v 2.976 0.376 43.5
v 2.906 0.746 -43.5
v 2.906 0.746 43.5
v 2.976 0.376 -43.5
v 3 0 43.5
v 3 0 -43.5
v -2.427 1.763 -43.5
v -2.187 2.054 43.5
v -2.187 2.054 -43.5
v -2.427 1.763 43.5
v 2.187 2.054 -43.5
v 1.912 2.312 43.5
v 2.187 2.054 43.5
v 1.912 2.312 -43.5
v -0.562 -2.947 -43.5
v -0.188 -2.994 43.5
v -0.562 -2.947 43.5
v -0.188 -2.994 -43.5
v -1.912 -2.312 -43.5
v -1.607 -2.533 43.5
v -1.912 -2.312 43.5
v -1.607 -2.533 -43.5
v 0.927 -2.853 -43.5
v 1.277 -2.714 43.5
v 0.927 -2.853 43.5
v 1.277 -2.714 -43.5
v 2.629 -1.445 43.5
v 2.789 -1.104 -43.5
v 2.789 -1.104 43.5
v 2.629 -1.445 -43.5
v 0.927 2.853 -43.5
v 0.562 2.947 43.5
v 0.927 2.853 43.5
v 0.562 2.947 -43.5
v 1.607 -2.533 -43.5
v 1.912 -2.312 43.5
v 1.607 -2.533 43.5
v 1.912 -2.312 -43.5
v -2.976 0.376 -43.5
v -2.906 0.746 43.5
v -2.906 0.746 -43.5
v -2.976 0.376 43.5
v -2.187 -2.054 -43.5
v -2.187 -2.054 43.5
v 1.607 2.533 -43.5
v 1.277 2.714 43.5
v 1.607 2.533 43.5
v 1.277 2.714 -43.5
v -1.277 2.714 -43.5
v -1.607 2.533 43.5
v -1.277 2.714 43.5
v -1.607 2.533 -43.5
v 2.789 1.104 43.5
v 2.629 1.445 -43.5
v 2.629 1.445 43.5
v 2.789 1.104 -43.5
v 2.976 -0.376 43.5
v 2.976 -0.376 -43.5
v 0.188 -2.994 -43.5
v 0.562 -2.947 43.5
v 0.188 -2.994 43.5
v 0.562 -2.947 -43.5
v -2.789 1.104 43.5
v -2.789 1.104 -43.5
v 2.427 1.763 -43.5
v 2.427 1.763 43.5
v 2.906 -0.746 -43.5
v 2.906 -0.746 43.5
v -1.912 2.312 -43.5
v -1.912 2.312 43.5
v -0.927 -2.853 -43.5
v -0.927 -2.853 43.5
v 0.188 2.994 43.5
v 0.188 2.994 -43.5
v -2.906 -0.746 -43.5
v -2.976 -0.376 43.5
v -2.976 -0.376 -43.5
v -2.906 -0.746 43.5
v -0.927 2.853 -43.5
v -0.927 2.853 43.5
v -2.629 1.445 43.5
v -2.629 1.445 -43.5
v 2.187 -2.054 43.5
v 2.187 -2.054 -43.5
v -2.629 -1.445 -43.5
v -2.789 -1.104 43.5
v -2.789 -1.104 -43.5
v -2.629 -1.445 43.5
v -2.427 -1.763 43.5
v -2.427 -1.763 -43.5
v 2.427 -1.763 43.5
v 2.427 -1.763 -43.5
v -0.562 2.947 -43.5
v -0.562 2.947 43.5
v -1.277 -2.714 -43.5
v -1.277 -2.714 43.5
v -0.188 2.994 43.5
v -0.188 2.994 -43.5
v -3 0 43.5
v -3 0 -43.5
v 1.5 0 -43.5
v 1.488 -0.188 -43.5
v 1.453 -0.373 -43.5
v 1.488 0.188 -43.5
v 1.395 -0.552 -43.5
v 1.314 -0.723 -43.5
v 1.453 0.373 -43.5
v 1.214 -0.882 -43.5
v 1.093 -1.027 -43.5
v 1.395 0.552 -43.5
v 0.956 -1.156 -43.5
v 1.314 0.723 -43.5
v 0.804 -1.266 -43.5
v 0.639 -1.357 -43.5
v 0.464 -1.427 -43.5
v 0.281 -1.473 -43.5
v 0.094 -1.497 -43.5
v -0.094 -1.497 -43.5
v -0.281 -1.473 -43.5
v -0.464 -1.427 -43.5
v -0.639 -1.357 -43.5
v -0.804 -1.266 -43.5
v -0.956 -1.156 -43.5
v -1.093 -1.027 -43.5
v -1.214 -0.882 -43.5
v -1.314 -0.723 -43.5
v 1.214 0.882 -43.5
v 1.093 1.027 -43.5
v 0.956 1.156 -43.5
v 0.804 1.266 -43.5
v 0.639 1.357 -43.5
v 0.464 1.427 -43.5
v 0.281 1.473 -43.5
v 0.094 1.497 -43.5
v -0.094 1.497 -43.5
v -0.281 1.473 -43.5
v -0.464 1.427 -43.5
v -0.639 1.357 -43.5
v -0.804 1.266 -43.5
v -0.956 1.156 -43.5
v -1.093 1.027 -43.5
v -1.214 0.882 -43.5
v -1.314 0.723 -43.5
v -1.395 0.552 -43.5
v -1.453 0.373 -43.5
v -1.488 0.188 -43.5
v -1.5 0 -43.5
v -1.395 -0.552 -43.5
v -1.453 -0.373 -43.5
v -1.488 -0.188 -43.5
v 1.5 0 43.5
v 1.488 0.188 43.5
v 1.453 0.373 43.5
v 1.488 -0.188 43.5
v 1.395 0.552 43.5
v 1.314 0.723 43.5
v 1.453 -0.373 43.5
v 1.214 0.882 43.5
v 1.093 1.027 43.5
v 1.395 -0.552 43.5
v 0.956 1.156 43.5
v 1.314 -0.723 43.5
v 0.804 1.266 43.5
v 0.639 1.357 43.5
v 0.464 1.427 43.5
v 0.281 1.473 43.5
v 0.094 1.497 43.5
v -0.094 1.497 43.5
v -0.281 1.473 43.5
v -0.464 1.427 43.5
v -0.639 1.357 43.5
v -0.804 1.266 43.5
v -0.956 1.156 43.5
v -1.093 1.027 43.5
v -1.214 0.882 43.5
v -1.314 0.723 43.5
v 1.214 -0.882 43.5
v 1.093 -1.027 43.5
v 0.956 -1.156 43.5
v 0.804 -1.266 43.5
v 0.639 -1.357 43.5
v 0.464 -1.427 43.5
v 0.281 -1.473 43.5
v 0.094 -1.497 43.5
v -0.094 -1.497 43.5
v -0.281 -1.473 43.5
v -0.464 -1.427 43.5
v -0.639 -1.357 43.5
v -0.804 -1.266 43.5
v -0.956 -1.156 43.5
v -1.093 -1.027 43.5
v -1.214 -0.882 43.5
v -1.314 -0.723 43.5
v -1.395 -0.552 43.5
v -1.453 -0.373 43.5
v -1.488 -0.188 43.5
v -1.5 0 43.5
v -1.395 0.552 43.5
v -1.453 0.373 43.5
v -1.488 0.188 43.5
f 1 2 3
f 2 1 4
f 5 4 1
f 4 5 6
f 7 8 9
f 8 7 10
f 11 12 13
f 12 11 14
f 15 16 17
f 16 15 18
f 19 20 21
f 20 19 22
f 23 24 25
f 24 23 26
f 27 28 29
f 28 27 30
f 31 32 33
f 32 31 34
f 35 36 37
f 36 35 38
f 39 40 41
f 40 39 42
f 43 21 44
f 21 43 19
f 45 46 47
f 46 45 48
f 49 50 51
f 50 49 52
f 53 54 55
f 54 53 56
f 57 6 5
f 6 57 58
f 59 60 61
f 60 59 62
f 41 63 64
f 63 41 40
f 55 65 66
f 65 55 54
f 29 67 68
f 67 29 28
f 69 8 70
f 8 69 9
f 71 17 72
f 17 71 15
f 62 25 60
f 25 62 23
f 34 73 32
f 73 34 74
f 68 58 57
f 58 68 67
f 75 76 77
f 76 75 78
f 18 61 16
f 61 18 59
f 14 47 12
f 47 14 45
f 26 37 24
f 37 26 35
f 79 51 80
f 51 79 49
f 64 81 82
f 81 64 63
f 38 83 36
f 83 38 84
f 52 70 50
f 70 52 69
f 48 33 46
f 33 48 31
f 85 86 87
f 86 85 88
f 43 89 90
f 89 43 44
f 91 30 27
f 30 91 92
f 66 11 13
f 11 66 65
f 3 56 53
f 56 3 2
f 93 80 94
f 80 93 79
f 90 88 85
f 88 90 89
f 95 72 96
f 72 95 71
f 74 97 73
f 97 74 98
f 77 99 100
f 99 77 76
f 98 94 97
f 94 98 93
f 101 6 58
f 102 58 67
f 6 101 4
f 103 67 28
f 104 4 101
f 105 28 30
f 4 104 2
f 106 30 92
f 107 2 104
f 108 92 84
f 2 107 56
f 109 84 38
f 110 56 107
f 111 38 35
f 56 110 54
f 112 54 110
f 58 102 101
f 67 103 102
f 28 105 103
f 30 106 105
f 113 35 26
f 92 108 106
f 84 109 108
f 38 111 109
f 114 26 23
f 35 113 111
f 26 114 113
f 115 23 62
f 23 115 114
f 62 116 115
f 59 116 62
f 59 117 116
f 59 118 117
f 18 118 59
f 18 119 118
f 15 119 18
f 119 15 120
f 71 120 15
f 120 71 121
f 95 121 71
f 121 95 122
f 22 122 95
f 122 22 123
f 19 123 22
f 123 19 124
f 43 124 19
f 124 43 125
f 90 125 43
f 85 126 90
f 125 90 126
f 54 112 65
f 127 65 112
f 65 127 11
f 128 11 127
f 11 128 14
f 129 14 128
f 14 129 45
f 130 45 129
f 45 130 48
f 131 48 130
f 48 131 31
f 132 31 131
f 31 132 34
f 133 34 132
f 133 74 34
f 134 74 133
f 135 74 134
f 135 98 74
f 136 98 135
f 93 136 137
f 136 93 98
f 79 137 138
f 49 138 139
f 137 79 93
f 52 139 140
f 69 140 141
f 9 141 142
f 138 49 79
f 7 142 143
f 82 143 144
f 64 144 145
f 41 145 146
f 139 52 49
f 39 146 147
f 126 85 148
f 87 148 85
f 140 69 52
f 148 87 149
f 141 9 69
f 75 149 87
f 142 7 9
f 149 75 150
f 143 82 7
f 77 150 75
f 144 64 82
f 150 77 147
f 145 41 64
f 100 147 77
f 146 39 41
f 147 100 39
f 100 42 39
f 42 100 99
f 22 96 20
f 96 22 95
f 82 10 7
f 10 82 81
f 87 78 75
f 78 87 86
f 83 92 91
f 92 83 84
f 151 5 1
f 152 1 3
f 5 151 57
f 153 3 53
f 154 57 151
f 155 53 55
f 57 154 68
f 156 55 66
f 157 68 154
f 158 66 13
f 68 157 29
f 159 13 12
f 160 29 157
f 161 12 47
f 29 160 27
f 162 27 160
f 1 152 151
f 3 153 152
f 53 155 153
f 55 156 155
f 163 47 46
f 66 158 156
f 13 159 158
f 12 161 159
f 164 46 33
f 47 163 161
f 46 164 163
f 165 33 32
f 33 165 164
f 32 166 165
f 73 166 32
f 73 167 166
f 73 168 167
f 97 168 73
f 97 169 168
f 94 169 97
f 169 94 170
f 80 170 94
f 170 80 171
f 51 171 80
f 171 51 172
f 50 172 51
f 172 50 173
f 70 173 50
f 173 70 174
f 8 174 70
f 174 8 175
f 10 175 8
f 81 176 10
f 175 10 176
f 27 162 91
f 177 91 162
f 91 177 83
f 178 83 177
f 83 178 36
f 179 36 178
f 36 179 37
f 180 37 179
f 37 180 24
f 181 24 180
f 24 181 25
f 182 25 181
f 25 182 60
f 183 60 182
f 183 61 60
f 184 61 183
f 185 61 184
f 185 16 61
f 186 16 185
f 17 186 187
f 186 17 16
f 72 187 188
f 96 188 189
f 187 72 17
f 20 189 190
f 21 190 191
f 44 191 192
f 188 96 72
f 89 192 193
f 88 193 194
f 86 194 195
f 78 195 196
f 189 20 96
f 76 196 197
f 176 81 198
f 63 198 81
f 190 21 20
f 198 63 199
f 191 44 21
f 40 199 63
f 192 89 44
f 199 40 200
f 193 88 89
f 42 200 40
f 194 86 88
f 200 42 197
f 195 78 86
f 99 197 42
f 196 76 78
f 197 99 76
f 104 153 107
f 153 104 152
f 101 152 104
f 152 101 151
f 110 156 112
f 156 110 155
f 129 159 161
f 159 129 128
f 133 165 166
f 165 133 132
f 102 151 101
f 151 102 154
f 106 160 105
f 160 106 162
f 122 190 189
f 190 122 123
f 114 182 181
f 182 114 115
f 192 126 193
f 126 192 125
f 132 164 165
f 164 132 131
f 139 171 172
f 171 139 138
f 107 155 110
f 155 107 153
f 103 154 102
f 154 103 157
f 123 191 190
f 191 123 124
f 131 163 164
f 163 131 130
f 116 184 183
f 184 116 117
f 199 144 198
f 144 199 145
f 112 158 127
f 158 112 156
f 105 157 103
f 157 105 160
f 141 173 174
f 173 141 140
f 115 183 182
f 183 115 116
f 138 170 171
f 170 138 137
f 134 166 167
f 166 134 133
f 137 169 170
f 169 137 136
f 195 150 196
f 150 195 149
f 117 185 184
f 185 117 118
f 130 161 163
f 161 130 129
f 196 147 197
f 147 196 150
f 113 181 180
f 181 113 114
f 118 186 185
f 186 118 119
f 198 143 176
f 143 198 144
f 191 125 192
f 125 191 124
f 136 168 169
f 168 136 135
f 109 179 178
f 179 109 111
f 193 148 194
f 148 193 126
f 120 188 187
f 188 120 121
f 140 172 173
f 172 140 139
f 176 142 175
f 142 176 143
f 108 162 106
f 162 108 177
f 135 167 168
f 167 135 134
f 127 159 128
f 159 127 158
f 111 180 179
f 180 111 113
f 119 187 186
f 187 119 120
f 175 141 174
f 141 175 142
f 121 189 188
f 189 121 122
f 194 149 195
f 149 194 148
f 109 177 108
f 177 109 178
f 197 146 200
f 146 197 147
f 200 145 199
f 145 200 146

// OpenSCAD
$fn = 50;


difference() {
	union() {
		translate(v = [0, 0, -43.5000000000]) {
			cylinder(h = 87, r = 3.0000000000);
		}
	}
	union() {
		translate(v = [0, 0, -100.0000000000]) {
			cylinder(h = 200, r = 1.5000000000);
		}
	}
}
